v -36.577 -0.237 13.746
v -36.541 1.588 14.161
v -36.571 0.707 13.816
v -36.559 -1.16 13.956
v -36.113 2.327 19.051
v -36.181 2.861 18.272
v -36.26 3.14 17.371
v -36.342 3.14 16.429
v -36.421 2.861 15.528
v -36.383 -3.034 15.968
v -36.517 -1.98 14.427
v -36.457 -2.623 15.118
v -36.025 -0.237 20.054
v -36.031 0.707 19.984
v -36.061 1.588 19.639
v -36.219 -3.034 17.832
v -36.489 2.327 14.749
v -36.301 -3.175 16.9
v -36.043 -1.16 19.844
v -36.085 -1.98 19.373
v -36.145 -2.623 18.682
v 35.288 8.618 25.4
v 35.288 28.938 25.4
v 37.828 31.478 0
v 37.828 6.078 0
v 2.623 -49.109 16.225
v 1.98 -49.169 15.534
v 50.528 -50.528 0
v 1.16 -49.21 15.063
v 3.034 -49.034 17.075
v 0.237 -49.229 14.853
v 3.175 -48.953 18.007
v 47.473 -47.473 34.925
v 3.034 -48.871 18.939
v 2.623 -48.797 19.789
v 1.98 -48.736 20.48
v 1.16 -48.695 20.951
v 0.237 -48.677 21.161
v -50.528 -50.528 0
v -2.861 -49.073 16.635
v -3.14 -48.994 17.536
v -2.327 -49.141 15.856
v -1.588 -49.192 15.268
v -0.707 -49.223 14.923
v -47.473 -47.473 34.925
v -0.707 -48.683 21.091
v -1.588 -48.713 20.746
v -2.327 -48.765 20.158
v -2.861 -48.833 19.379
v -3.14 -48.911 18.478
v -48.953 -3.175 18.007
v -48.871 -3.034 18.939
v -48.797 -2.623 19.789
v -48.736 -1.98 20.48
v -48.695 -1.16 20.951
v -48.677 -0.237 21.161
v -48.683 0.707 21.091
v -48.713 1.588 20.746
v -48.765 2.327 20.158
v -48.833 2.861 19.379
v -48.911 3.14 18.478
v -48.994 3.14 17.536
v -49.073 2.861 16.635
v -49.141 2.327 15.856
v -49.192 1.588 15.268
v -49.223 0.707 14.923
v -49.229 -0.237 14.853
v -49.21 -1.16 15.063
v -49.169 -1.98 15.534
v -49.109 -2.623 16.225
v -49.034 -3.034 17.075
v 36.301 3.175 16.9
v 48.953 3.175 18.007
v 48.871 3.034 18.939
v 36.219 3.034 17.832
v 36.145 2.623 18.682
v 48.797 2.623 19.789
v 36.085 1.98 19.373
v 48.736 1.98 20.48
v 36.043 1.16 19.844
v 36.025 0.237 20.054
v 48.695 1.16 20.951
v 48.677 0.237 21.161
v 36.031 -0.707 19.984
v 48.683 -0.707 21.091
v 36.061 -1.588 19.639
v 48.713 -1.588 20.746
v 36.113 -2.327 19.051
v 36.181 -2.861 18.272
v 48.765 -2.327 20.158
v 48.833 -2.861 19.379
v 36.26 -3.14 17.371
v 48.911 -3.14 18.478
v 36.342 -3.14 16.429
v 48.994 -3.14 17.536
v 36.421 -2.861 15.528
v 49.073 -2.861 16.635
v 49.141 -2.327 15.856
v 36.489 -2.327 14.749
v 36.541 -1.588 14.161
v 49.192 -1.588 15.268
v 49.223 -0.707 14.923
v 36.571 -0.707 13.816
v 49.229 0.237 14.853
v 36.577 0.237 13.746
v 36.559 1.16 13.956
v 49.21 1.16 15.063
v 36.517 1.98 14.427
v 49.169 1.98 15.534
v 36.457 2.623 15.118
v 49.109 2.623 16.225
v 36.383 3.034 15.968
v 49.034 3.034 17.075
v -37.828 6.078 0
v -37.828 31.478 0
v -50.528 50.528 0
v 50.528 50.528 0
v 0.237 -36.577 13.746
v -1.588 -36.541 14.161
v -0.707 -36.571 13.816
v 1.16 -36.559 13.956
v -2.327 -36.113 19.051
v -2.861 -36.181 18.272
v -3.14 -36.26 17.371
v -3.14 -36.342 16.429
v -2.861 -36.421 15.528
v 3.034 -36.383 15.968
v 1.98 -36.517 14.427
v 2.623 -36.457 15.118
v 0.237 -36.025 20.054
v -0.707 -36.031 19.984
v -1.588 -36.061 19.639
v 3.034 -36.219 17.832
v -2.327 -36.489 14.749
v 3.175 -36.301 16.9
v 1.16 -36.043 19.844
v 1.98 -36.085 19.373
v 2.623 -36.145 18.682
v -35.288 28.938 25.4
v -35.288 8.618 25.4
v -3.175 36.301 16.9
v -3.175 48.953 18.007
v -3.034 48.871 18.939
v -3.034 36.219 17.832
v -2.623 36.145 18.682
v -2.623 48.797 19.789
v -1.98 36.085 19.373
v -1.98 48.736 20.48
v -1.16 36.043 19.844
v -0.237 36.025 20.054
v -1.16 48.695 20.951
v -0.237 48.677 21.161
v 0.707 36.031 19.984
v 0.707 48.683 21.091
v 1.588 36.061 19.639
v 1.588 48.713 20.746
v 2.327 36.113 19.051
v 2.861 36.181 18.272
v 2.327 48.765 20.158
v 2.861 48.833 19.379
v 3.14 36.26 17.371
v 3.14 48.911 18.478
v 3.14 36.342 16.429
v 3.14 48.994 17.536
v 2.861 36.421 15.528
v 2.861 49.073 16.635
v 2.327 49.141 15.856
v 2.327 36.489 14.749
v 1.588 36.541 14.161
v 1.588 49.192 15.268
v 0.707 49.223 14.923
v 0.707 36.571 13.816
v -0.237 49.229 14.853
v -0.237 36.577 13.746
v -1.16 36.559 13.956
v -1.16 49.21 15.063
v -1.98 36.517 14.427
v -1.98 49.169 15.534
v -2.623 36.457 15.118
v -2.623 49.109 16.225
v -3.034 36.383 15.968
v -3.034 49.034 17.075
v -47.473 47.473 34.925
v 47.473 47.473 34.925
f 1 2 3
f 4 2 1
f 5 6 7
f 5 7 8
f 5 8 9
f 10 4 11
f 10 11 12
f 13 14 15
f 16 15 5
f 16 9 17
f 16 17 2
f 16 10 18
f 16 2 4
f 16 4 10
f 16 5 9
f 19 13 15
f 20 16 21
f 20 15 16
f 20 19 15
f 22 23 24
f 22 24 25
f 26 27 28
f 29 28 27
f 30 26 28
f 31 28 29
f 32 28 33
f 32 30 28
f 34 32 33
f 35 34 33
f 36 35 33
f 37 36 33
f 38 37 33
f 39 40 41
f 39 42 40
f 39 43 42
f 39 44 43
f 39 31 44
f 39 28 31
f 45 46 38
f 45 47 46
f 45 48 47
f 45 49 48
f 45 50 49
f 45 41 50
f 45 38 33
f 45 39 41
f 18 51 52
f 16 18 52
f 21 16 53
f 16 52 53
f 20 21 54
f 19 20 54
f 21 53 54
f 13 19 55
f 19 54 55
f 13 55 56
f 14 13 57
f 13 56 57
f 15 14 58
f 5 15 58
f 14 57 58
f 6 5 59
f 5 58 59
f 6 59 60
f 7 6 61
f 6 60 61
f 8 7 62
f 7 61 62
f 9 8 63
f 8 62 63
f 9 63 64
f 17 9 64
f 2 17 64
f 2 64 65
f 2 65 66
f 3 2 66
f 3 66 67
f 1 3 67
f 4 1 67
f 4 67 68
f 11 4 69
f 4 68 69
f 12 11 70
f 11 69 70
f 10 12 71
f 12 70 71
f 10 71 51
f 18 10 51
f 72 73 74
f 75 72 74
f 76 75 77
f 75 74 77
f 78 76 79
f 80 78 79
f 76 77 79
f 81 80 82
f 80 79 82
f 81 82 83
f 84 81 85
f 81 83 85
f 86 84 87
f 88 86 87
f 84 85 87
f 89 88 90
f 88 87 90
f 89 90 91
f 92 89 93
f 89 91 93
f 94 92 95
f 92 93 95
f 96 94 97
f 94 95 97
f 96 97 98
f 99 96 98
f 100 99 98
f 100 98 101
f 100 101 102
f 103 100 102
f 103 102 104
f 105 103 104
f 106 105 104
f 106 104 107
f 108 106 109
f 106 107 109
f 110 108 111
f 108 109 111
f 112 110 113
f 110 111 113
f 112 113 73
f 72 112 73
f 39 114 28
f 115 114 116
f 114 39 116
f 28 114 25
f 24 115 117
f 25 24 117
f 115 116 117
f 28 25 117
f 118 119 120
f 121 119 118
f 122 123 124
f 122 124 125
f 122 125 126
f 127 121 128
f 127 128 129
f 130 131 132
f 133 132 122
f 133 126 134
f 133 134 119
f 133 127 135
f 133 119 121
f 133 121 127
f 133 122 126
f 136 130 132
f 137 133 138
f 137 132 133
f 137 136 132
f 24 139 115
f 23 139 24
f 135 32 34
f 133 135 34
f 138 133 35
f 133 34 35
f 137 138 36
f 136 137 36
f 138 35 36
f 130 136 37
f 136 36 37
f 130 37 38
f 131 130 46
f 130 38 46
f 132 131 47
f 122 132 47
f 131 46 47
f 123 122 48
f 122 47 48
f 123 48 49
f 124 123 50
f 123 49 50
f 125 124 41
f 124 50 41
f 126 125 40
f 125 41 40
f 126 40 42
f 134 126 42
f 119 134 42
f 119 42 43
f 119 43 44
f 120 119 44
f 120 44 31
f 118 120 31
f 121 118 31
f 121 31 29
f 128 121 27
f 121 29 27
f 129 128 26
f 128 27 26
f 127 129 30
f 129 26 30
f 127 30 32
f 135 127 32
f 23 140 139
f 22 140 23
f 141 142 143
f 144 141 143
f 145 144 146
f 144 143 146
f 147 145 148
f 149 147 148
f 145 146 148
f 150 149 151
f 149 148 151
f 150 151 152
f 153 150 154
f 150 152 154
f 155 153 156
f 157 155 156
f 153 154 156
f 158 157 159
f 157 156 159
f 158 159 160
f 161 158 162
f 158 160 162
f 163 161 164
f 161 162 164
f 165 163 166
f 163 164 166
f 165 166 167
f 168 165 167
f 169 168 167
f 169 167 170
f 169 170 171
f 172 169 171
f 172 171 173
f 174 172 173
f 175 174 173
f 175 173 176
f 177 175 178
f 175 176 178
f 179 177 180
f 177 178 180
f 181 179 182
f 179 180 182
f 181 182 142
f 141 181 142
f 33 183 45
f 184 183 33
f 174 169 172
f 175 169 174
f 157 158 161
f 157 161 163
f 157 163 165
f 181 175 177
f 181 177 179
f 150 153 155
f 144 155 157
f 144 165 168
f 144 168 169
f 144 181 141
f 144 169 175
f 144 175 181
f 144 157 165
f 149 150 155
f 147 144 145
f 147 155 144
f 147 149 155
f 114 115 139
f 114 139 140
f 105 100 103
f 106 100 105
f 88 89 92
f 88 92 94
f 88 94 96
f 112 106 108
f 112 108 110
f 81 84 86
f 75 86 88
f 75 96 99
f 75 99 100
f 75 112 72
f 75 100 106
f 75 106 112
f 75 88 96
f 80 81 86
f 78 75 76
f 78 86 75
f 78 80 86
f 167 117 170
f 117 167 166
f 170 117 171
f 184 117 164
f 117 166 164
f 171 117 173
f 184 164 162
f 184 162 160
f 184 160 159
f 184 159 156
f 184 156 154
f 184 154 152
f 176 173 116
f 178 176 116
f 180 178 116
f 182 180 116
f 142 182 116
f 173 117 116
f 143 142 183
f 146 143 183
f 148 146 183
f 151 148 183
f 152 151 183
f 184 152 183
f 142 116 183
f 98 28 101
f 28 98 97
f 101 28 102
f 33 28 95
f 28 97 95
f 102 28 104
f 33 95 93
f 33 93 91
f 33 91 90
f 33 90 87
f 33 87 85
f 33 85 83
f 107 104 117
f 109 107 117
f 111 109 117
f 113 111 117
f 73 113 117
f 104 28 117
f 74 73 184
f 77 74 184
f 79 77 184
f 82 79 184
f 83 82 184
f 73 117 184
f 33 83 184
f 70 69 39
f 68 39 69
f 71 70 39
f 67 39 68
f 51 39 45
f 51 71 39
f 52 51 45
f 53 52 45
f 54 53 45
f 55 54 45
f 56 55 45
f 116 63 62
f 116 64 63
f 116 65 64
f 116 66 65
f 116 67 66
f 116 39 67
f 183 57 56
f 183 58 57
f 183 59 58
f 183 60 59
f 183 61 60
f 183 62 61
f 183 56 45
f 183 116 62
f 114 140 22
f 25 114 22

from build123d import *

# Parameters (mm, degrees)
F0_W        = 101.6
F0_H        = 101.6
F1_DEPTH    = 34.925
F2_T1_DEPTH = 299.3404177556
F2_T3_DEPTH = 299.3404177556
F3_R        = 3.175
F4_DEPTH    = 12.7
F5_R        = 3.175
F6_DEPTH    = 12.7
F7_R        = 3.175
F8_DEPTH    = 12.7
F9_R        = 3.175
F10_DEPTH   = 12.7
F11_W       = 75.6562831473
F11_H       = 25.4
F12_DEPTH   = 25.4
F13_SIZE2   = 2.53999
F13_SIZE    = 25.39999


# Not quite as in the source:
# - a fillet or chamfer that OpenCascade refuses, or shapes differently, is made with other operations: its cross-section is extruded or revolved along the edge and cut away or added
# - a fillet or chamfer is up to 0.001 mm smaller than in the source, because OpenCascade refuses the exact size


with BuildPart() as f1:
    # F0 (on Top) → F1 (new body)
    with BuildSketch(Plane.XY):
        Rectangle(F0_W, F0_H)
    extrude(amount=F1_DEPTH)

    # F2: chamfer of 3.3274 x 38.0323560322 on 4 edges, made by hand

    # F2_s2 → F2_t1 (cut)
    with BuildSketch(Plane.XZ.offset(-149.6702088778)):
        Polygon((-50.8, -3.1073560322), (-47.4726, 34.925), (-50.8, 34.925), align=None)
        Polygon((50.8, -3.1073560322), (47.4726, 34.925), (50.8, 34.925), align=None)
    extrude(amount=F2_T1_DEPTH, mode=Mode.SUBTRACT)

    # F2_s4 → F2_t3 (cut)
    with BuildSketch(Plane.YZ.offset(-149.6702088778)):
        Polygon((-50.8, -3.1073560322), (-47.4726, 34.925), (-50.8, 34.925), align=None)
        Polygon((50.8, -3.1073560322), (47.4726, 34.925), (50.8, 34.925), align=None)
    extrude(amount=F2_T3_DEPTH, mode=Mode.SUBTRACT)

    # F3 (on face) → F4 (cut)
    with BuildSketch(Plane(origin=(0, 50.1443235703, 4.3870598526), x_dir=(-1, 0, 0), z_dir=(0, 0.9961946981, 0.0871557427))):
        with Locations((0, 13.6719250414)):
            Circle(F3_R)
    extrude(amount=-F4_DEPTH, mode=Mode.SUBTRACT)

    # F5 (on face) → F6 (cut)
    with BuildSketch(Plane(origin=(0, -50.1443235703, 4.3870598526), x_dir=(1, 0, 0), z_dir=(0, -0.9961946981, 0.0871557427))):
        with Locations((0, 13.6719250414)):
            Circle(F5_R)
    extrude(amount=-F6_DEPTH, mode=Mode.SUBTRACT)

    # F7 (on face) → F8 (cut)
    with BuildSketch(Plane(origin=(50.1443235703, 0, 4.3870598526), x_dir=(0, 1, 0), z_dir=(0.9961946981, 0, 0.0871557427))):
        with Locations((0, 13.6719250414)):
            Circle(F7_R)
    extrude(amount=-F8_DEPTH, mode=Mode.SUBTRACT)

    # F9 (on face) → F10 (cut)
    with BuildSketch(Plane(origin=(-50.1443235703, 0, 4.3870598526), x_dir=(0, -1, 0), z_dir=(-0.9961946981, 0, 0.0871557427))):
        with Locations((0, 13.6719250414)):
            Circle(F9_R)
    extrude(amount=-F10_DEPTH, mode=Mode.SUBTRACT)

    # F11 (on face) → F12 (cut)
    with BuildSketch(Plane(origin=(0, 0, 0), x_dir=(1, 0, 0), z_dir=(0, 0, -1))):
        with Locations((0, -18.7781415736)):
            Rectangle(F11_W, F11_H)
    extrude(amount=-F12_DEPTH, mode=Mode.SUBTRACT)

    # F13 (size 25.4 and 2.54 in the source; OpenCascade refuses exactly that, so slightly less here)
    f13_edges = [f1.edges().sort_by_distance(p)[0] for p in [
        (0, 6.078142, 25.4),
        (-37.828142, 18.778142, 25.4),
        (37.828142, 18.778142, 25.4),
        (0, 31.478142, 25.4),
    ]]
    chamfer(f13_edges, length=F13_SIZE, length2=F13_SIZE2)


solid = f1.part
